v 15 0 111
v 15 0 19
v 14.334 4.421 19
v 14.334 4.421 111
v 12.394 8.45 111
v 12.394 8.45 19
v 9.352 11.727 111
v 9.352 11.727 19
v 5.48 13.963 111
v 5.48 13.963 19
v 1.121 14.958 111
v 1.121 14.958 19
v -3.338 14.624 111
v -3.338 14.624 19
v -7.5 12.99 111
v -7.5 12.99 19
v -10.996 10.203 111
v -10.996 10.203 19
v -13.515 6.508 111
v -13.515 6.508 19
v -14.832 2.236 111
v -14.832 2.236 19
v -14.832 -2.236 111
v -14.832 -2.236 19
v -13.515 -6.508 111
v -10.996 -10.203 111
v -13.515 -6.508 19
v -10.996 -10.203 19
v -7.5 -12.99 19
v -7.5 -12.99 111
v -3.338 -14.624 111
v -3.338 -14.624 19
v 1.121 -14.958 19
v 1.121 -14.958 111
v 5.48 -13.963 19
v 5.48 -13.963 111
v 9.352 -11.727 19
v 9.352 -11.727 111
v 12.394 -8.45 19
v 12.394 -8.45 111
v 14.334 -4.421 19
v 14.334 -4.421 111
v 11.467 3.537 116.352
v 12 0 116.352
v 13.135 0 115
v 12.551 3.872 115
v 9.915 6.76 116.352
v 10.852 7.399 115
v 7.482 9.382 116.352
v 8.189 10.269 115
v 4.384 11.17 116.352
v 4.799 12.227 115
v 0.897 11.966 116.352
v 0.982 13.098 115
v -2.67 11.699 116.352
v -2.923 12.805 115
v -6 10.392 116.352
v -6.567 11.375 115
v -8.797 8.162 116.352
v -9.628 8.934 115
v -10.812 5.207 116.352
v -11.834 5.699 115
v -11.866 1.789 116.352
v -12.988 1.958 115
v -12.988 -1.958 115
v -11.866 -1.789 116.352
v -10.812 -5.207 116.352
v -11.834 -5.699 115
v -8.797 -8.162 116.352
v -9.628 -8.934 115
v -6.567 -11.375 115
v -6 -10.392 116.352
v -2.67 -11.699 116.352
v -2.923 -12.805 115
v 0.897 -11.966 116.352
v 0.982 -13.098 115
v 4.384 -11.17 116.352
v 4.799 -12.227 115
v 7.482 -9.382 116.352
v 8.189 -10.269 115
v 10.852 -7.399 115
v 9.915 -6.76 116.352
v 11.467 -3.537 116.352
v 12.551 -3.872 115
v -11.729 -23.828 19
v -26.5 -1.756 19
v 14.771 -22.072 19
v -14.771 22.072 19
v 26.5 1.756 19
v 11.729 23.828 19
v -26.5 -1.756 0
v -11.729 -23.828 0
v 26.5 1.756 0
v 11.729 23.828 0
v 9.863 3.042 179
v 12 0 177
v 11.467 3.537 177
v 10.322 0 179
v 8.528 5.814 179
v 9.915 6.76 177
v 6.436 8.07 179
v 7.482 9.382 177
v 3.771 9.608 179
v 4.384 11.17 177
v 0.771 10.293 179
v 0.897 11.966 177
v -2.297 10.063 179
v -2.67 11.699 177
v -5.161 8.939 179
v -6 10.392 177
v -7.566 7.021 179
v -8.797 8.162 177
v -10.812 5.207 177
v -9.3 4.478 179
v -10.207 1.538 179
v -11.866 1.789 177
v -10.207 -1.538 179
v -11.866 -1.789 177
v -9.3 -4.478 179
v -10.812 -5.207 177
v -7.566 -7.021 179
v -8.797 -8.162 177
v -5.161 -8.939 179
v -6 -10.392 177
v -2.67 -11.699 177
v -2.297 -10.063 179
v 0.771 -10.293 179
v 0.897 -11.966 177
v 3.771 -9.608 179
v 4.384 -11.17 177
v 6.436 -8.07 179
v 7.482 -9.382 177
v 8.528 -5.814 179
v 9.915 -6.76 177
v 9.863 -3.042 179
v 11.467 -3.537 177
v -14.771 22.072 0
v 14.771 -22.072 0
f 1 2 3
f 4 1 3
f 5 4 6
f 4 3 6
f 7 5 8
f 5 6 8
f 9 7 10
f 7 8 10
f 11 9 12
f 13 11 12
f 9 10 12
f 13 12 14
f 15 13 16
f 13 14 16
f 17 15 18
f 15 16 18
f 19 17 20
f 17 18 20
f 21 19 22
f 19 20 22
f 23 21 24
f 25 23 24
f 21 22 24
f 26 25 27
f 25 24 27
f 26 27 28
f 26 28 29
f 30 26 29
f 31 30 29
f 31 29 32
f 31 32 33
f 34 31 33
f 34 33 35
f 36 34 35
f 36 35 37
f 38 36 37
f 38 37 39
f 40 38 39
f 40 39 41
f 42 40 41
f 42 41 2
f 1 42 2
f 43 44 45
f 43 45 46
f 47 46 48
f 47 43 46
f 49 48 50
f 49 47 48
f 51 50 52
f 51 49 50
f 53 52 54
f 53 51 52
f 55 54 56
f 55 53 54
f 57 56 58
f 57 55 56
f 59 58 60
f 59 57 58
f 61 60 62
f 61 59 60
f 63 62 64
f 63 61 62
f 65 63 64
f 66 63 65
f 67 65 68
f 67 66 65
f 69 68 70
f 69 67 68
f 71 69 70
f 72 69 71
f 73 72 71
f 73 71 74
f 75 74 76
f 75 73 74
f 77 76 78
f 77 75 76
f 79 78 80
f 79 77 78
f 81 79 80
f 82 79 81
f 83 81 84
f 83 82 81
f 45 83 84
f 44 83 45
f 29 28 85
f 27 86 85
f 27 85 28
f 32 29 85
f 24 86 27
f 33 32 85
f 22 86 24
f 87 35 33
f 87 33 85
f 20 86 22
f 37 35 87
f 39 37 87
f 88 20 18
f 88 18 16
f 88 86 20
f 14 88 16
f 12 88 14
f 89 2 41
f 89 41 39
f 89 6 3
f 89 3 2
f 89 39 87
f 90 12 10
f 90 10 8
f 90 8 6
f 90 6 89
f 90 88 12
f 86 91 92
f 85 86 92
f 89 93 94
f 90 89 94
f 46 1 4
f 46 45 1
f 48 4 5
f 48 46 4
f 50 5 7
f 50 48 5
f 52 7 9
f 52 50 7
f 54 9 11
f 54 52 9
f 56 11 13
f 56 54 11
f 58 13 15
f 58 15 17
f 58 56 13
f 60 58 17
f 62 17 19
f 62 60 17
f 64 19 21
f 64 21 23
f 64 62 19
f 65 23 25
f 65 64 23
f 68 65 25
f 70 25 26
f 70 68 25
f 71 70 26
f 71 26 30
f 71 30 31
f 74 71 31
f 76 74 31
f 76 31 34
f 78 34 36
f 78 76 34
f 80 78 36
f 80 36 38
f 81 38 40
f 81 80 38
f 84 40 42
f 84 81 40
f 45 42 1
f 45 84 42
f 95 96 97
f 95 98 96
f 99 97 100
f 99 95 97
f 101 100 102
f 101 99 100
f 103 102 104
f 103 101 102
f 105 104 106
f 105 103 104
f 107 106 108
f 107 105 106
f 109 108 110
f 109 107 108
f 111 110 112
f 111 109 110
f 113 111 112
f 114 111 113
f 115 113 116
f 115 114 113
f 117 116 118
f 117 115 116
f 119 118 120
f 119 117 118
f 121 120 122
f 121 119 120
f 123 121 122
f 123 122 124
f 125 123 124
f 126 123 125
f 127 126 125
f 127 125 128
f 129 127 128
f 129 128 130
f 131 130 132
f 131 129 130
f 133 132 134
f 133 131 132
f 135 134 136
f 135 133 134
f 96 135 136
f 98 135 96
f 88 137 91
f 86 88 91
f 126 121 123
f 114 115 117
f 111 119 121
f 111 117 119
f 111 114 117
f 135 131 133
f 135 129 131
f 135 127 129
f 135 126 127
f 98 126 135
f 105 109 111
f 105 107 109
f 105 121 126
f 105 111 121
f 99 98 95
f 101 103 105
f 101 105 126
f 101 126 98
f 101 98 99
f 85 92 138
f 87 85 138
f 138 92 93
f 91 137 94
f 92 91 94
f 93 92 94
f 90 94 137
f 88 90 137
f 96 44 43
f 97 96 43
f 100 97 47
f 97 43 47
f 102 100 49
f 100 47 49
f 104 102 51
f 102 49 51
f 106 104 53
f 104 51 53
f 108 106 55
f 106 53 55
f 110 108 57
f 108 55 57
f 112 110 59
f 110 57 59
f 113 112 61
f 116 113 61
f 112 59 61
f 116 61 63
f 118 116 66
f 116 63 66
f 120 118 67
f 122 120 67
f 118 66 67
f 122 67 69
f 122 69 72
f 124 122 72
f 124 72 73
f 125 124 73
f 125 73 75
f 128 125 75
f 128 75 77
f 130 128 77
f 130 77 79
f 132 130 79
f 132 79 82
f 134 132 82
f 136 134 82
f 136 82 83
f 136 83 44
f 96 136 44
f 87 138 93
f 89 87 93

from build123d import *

# Parameters (mm, degrees)
SKETCH_1_R       = 15
EXTRUDE_1_DEPTH  = 111
EXTRUDE_2_DEPTH  = 19
SKETCH_7_R       = 15
EXTRUDE_4_DEPTH  = 4
EXTRUDE_4_TAPER  = 25
SKETCH_22_R      = 12
EXTRUDE_22_DEPTH = 62
SKETCH_23_R      = 13.134769367
EXTRUDE_24_DEPTH = 2
EXTRUDE_24_TAPER = 40
SKETCH_24_R      = 12
EXTRUDE_25_DEPTH = 2
EXTRUDE_25_TAPER = 40


with BuildPart() as part:
    # 草图1 → 拉伸1 (new body)
    with BuildSketch(Plane.XY):
        Circle(SKETCH_1_R)
    extrude(amount=EXTRUDE_1_DEPTH)

    # 草图2 → 拉伸2 (add)
    with BuildSketch(Plane.XY):
        Polygon((14.770690633, -22.071702054), (26.5, 1.755942292), (11.729309367, 23.827644346), (-14.770690633, 22.071702054), (-26.5, -1.755942292), (-11.729309367, -23.827644346), align=None)
    extrude(amount=EXTRUDE_2_DEPTH)

    # 草图7 → 拉伸4 (add)
    with BuildSketch(Plane.XY.offset(111)):
        Circle(SKETCH_7_R)
    extrude(amount=EXTRUDE_4_DEPTH, taper=EXTRUDE_4_TAPER)

    # 草图22 → 拉伸22 (add)
    with BuildSketch(Plane.XY.offset(115)):
        Circle(SKETCH_22_R)
    extrude(amount=EXTRUDE_22_DEPTH)

    # 草图23 → 拉伸24 (add)
    with BuildSketch(Plane.XY.offset(115)):
        Circle(SKETCH_23_R)
    extrude(amount=EXTRUDE_24_DEPTH, taper=EXTRUDE_24_TAPER)

    # 草图24 → 拉伸25 (add)
    with BuildSketch(Plane.XY.offset(177)):
        Circle(SKETCH_24_R)
    extrude(amount=EXTRUDE_25_DEPTH, taper=EXTRUDE_25_TAPER)


solid = part.part
